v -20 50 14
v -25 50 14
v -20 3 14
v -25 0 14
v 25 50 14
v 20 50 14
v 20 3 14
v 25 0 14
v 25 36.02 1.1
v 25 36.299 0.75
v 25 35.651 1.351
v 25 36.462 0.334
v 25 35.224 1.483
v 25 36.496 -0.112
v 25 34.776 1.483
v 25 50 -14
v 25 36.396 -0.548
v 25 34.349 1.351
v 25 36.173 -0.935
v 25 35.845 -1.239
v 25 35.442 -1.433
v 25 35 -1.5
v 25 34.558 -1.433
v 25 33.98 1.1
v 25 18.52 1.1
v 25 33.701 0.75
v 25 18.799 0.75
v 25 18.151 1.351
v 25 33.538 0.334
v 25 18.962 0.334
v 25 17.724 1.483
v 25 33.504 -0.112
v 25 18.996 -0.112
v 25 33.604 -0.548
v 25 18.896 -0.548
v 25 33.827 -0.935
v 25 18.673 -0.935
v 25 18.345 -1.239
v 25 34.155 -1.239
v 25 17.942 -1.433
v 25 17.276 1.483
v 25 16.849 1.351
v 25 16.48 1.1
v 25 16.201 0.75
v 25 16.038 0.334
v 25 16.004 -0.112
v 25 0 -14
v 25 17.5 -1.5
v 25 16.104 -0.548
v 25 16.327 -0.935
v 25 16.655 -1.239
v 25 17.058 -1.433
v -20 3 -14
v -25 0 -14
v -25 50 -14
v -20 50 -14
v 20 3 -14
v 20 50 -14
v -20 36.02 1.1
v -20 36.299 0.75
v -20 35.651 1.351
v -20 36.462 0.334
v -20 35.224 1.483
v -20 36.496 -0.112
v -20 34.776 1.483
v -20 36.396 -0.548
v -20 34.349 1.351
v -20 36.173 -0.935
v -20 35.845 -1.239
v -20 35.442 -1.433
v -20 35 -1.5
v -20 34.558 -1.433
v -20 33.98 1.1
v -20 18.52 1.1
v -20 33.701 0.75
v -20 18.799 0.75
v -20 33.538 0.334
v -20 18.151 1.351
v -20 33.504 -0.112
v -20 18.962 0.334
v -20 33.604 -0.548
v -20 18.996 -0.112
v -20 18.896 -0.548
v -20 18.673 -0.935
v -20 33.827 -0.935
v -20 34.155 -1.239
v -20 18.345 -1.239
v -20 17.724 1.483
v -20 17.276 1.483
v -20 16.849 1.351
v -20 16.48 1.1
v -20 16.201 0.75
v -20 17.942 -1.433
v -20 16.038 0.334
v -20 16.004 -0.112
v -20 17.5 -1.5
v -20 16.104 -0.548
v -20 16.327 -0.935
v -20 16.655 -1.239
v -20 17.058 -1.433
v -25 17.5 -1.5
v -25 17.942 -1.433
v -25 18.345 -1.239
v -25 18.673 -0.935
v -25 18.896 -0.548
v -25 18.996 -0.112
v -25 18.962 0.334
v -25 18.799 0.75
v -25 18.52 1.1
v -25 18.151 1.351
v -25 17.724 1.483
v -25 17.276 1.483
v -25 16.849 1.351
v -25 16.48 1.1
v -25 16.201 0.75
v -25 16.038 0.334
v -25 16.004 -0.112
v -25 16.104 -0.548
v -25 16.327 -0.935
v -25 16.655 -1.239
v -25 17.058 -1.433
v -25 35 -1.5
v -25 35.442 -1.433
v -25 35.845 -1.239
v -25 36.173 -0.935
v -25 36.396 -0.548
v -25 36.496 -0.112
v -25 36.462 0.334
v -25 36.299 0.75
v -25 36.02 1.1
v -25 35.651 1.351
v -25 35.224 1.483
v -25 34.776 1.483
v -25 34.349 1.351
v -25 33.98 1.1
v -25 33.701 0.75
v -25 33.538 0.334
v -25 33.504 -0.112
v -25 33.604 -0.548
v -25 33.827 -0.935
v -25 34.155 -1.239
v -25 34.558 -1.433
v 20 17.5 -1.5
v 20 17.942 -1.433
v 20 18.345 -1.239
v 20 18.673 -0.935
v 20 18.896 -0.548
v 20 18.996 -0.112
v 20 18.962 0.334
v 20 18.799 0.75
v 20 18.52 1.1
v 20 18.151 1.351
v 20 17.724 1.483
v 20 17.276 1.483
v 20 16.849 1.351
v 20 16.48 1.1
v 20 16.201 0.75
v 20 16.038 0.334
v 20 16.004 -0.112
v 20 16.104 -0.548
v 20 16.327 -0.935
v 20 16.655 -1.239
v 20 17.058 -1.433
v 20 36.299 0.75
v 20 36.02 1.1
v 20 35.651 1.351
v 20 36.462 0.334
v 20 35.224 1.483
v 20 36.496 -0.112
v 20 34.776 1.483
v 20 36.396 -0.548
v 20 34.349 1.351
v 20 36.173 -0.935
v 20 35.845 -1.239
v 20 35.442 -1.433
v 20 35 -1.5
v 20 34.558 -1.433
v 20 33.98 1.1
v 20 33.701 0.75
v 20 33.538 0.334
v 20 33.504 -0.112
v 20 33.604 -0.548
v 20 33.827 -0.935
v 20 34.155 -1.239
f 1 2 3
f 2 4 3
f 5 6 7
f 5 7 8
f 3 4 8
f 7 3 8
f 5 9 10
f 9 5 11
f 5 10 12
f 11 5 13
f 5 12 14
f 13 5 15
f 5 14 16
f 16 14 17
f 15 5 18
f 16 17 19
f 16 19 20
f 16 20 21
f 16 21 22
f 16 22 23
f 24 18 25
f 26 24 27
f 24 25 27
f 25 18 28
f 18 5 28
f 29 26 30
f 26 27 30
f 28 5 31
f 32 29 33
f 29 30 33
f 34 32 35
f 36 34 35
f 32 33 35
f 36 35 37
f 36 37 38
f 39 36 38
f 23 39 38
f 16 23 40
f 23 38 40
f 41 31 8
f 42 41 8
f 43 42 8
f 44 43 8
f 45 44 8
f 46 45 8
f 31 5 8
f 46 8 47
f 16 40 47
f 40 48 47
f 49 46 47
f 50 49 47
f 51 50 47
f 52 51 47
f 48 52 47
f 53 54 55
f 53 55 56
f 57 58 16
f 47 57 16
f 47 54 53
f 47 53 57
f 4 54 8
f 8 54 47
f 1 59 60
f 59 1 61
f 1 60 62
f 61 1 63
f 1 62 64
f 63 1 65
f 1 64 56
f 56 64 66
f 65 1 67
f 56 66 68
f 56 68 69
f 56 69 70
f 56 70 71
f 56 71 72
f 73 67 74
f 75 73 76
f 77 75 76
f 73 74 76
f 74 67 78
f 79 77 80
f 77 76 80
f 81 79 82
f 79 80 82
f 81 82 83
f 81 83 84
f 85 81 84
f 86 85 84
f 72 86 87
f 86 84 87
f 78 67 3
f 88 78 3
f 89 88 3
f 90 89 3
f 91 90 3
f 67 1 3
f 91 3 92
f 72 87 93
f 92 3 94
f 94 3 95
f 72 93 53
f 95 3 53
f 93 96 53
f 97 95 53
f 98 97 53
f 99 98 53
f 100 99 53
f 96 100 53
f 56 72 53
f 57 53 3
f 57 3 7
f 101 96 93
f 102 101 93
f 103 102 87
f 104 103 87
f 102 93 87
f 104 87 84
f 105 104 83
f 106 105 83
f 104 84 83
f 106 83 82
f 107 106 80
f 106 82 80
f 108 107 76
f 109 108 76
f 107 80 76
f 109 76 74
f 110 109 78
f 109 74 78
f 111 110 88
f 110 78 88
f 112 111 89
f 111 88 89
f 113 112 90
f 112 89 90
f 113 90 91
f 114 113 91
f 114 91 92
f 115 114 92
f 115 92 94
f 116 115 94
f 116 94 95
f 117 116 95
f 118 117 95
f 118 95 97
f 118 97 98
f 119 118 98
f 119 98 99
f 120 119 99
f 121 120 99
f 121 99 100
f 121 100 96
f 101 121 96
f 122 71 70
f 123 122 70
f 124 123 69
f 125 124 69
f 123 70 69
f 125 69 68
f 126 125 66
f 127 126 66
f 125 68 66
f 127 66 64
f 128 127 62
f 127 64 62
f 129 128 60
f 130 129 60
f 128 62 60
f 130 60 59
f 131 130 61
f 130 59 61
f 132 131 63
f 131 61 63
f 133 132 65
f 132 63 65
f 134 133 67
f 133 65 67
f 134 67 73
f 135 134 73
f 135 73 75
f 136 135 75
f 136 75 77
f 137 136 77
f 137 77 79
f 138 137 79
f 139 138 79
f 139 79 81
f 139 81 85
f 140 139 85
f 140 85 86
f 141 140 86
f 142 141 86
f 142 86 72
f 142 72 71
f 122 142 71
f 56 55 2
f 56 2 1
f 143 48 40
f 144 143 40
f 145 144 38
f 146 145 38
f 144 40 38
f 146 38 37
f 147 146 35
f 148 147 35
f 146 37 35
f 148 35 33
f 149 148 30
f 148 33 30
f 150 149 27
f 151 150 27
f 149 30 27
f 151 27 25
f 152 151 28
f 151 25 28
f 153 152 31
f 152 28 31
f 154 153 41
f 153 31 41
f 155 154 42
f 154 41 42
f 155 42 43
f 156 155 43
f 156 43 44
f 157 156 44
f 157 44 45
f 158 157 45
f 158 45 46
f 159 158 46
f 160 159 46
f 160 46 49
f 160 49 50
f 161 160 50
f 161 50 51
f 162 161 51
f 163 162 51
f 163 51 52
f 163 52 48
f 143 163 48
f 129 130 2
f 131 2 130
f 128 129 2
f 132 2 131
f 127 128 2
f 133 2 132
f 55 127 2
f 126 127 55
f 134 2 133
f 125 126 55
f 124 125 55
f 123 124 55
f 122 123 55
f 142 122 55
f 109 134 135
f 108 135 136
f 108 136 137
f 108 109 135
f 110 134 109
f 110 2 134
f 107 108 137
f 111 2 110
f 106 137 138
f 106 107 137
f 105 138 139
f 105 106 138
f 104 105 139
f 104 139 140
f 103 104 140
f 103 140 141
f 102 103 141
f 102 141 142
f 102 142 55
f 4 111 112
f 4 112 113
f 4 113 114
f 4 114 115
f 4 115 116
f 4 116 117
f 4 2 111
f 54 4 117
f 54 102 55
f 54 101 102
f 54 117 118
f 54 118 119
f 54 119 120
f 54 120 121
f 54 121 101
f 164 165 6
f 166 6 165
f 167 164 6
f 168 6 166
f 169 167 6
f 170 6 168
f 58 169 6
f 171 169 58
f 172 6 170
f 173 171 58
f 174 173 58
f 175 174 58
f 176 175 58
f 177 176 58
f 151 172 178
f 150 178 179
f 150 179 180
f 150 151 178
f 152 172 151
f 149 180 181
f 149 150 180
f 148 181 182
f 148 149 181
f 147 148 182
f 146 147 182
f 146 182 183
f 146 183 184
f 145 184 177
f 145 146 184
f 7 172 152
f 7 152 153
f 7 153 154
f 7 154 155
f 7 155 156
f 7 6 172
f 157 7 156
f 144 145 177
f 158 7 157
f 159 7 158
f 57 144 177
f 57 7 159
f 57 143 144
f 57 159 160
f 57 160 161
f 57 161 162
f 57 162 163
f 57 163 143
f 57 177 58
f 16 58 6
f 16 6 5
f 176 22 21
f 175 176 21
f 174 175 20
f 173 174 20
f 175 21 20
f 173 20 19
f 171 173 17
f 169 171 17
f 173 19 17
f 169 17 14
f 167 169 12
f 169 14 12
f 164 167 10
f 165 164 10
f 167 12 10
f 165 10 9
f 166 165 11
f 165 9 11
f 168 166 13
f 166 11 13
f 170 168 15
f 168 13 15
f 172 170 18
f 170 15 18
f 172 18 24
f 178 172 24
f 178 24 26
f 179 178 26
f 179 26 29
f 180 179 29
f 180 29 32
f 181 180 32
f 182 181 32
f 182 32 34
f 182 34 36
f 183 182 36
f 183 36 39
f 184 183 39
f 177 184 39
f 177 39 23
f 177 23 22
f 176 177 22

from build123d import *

# Parameters (mm, degrees)
CROQUIS1_W              = 5
CROQUIS1_H              = 28
CROQUIS1_W_2            = 40
SALIENTE_EXTRUIR1_DEPTH = 3
CROQUIS2_W              = 5
CROQUIS2_H              = 28
SALIENTE_EXTRUIR2_DEPTH = 47
CROQUIS3_R              = 1.5
CORTAR_EXTRUIR1_DEPTH   = 51


with BuildPart() as part:
    # Croquis1 → Saliente-Extruir1 (new body)
    with BuildSketch(Plane(origin=(0, 0, 0), x_dir=(1, 0, 0), z_dir=(0, 1, 0))):
        with Locations((-22.5, 0)):
            Rectangle(CROQUIS1_W, CROQUIS1_H)
        Rectangle(CROQUIS1_W_2, CROQUIS1_H)
        with Locations((22.5, 0)):
            Rectangle(CROQUIS1_W, CROQUIS1_H)
    extrude(amount=SALIENTE_EXTRUIR1_DEPTH)

    # Croquis2 → Saliente-Extruir2 (add)
    with BuildSketch(Plane(origin=(0, 3, 0), x_dir=(1, 0, 0), z_dir=(0, 1, 0))):
        with Locations((-22.5, 0)):
            Rectangle(CROQUIS2_W, CROQUIS2_H)
        with Locations((22.5, 0)):
            Rectangle(CROQUIS2_W, CROQUIS2_H)
    extrude(amount=SALIENTE_EXTRUIR2_DEPTH)

    # Croquis3 → Cortar-Extruir1 (cut, through all)
    with BuildSketch(Plane(origin=(25, 0, 0), x_dir=(0, 0, -1), z_dir=(1, 0, 0))):
        with Locations((0, 17.5)):
            Circle(CROQUIS3_R)
        with Locations((0, 35)):
            Circle(CROQUIS3_R)
    extrude(amount=-CORTAR_EXTRUIR1_DEPTH, mode=Mode.SUBTRACT)


solid = part.part
